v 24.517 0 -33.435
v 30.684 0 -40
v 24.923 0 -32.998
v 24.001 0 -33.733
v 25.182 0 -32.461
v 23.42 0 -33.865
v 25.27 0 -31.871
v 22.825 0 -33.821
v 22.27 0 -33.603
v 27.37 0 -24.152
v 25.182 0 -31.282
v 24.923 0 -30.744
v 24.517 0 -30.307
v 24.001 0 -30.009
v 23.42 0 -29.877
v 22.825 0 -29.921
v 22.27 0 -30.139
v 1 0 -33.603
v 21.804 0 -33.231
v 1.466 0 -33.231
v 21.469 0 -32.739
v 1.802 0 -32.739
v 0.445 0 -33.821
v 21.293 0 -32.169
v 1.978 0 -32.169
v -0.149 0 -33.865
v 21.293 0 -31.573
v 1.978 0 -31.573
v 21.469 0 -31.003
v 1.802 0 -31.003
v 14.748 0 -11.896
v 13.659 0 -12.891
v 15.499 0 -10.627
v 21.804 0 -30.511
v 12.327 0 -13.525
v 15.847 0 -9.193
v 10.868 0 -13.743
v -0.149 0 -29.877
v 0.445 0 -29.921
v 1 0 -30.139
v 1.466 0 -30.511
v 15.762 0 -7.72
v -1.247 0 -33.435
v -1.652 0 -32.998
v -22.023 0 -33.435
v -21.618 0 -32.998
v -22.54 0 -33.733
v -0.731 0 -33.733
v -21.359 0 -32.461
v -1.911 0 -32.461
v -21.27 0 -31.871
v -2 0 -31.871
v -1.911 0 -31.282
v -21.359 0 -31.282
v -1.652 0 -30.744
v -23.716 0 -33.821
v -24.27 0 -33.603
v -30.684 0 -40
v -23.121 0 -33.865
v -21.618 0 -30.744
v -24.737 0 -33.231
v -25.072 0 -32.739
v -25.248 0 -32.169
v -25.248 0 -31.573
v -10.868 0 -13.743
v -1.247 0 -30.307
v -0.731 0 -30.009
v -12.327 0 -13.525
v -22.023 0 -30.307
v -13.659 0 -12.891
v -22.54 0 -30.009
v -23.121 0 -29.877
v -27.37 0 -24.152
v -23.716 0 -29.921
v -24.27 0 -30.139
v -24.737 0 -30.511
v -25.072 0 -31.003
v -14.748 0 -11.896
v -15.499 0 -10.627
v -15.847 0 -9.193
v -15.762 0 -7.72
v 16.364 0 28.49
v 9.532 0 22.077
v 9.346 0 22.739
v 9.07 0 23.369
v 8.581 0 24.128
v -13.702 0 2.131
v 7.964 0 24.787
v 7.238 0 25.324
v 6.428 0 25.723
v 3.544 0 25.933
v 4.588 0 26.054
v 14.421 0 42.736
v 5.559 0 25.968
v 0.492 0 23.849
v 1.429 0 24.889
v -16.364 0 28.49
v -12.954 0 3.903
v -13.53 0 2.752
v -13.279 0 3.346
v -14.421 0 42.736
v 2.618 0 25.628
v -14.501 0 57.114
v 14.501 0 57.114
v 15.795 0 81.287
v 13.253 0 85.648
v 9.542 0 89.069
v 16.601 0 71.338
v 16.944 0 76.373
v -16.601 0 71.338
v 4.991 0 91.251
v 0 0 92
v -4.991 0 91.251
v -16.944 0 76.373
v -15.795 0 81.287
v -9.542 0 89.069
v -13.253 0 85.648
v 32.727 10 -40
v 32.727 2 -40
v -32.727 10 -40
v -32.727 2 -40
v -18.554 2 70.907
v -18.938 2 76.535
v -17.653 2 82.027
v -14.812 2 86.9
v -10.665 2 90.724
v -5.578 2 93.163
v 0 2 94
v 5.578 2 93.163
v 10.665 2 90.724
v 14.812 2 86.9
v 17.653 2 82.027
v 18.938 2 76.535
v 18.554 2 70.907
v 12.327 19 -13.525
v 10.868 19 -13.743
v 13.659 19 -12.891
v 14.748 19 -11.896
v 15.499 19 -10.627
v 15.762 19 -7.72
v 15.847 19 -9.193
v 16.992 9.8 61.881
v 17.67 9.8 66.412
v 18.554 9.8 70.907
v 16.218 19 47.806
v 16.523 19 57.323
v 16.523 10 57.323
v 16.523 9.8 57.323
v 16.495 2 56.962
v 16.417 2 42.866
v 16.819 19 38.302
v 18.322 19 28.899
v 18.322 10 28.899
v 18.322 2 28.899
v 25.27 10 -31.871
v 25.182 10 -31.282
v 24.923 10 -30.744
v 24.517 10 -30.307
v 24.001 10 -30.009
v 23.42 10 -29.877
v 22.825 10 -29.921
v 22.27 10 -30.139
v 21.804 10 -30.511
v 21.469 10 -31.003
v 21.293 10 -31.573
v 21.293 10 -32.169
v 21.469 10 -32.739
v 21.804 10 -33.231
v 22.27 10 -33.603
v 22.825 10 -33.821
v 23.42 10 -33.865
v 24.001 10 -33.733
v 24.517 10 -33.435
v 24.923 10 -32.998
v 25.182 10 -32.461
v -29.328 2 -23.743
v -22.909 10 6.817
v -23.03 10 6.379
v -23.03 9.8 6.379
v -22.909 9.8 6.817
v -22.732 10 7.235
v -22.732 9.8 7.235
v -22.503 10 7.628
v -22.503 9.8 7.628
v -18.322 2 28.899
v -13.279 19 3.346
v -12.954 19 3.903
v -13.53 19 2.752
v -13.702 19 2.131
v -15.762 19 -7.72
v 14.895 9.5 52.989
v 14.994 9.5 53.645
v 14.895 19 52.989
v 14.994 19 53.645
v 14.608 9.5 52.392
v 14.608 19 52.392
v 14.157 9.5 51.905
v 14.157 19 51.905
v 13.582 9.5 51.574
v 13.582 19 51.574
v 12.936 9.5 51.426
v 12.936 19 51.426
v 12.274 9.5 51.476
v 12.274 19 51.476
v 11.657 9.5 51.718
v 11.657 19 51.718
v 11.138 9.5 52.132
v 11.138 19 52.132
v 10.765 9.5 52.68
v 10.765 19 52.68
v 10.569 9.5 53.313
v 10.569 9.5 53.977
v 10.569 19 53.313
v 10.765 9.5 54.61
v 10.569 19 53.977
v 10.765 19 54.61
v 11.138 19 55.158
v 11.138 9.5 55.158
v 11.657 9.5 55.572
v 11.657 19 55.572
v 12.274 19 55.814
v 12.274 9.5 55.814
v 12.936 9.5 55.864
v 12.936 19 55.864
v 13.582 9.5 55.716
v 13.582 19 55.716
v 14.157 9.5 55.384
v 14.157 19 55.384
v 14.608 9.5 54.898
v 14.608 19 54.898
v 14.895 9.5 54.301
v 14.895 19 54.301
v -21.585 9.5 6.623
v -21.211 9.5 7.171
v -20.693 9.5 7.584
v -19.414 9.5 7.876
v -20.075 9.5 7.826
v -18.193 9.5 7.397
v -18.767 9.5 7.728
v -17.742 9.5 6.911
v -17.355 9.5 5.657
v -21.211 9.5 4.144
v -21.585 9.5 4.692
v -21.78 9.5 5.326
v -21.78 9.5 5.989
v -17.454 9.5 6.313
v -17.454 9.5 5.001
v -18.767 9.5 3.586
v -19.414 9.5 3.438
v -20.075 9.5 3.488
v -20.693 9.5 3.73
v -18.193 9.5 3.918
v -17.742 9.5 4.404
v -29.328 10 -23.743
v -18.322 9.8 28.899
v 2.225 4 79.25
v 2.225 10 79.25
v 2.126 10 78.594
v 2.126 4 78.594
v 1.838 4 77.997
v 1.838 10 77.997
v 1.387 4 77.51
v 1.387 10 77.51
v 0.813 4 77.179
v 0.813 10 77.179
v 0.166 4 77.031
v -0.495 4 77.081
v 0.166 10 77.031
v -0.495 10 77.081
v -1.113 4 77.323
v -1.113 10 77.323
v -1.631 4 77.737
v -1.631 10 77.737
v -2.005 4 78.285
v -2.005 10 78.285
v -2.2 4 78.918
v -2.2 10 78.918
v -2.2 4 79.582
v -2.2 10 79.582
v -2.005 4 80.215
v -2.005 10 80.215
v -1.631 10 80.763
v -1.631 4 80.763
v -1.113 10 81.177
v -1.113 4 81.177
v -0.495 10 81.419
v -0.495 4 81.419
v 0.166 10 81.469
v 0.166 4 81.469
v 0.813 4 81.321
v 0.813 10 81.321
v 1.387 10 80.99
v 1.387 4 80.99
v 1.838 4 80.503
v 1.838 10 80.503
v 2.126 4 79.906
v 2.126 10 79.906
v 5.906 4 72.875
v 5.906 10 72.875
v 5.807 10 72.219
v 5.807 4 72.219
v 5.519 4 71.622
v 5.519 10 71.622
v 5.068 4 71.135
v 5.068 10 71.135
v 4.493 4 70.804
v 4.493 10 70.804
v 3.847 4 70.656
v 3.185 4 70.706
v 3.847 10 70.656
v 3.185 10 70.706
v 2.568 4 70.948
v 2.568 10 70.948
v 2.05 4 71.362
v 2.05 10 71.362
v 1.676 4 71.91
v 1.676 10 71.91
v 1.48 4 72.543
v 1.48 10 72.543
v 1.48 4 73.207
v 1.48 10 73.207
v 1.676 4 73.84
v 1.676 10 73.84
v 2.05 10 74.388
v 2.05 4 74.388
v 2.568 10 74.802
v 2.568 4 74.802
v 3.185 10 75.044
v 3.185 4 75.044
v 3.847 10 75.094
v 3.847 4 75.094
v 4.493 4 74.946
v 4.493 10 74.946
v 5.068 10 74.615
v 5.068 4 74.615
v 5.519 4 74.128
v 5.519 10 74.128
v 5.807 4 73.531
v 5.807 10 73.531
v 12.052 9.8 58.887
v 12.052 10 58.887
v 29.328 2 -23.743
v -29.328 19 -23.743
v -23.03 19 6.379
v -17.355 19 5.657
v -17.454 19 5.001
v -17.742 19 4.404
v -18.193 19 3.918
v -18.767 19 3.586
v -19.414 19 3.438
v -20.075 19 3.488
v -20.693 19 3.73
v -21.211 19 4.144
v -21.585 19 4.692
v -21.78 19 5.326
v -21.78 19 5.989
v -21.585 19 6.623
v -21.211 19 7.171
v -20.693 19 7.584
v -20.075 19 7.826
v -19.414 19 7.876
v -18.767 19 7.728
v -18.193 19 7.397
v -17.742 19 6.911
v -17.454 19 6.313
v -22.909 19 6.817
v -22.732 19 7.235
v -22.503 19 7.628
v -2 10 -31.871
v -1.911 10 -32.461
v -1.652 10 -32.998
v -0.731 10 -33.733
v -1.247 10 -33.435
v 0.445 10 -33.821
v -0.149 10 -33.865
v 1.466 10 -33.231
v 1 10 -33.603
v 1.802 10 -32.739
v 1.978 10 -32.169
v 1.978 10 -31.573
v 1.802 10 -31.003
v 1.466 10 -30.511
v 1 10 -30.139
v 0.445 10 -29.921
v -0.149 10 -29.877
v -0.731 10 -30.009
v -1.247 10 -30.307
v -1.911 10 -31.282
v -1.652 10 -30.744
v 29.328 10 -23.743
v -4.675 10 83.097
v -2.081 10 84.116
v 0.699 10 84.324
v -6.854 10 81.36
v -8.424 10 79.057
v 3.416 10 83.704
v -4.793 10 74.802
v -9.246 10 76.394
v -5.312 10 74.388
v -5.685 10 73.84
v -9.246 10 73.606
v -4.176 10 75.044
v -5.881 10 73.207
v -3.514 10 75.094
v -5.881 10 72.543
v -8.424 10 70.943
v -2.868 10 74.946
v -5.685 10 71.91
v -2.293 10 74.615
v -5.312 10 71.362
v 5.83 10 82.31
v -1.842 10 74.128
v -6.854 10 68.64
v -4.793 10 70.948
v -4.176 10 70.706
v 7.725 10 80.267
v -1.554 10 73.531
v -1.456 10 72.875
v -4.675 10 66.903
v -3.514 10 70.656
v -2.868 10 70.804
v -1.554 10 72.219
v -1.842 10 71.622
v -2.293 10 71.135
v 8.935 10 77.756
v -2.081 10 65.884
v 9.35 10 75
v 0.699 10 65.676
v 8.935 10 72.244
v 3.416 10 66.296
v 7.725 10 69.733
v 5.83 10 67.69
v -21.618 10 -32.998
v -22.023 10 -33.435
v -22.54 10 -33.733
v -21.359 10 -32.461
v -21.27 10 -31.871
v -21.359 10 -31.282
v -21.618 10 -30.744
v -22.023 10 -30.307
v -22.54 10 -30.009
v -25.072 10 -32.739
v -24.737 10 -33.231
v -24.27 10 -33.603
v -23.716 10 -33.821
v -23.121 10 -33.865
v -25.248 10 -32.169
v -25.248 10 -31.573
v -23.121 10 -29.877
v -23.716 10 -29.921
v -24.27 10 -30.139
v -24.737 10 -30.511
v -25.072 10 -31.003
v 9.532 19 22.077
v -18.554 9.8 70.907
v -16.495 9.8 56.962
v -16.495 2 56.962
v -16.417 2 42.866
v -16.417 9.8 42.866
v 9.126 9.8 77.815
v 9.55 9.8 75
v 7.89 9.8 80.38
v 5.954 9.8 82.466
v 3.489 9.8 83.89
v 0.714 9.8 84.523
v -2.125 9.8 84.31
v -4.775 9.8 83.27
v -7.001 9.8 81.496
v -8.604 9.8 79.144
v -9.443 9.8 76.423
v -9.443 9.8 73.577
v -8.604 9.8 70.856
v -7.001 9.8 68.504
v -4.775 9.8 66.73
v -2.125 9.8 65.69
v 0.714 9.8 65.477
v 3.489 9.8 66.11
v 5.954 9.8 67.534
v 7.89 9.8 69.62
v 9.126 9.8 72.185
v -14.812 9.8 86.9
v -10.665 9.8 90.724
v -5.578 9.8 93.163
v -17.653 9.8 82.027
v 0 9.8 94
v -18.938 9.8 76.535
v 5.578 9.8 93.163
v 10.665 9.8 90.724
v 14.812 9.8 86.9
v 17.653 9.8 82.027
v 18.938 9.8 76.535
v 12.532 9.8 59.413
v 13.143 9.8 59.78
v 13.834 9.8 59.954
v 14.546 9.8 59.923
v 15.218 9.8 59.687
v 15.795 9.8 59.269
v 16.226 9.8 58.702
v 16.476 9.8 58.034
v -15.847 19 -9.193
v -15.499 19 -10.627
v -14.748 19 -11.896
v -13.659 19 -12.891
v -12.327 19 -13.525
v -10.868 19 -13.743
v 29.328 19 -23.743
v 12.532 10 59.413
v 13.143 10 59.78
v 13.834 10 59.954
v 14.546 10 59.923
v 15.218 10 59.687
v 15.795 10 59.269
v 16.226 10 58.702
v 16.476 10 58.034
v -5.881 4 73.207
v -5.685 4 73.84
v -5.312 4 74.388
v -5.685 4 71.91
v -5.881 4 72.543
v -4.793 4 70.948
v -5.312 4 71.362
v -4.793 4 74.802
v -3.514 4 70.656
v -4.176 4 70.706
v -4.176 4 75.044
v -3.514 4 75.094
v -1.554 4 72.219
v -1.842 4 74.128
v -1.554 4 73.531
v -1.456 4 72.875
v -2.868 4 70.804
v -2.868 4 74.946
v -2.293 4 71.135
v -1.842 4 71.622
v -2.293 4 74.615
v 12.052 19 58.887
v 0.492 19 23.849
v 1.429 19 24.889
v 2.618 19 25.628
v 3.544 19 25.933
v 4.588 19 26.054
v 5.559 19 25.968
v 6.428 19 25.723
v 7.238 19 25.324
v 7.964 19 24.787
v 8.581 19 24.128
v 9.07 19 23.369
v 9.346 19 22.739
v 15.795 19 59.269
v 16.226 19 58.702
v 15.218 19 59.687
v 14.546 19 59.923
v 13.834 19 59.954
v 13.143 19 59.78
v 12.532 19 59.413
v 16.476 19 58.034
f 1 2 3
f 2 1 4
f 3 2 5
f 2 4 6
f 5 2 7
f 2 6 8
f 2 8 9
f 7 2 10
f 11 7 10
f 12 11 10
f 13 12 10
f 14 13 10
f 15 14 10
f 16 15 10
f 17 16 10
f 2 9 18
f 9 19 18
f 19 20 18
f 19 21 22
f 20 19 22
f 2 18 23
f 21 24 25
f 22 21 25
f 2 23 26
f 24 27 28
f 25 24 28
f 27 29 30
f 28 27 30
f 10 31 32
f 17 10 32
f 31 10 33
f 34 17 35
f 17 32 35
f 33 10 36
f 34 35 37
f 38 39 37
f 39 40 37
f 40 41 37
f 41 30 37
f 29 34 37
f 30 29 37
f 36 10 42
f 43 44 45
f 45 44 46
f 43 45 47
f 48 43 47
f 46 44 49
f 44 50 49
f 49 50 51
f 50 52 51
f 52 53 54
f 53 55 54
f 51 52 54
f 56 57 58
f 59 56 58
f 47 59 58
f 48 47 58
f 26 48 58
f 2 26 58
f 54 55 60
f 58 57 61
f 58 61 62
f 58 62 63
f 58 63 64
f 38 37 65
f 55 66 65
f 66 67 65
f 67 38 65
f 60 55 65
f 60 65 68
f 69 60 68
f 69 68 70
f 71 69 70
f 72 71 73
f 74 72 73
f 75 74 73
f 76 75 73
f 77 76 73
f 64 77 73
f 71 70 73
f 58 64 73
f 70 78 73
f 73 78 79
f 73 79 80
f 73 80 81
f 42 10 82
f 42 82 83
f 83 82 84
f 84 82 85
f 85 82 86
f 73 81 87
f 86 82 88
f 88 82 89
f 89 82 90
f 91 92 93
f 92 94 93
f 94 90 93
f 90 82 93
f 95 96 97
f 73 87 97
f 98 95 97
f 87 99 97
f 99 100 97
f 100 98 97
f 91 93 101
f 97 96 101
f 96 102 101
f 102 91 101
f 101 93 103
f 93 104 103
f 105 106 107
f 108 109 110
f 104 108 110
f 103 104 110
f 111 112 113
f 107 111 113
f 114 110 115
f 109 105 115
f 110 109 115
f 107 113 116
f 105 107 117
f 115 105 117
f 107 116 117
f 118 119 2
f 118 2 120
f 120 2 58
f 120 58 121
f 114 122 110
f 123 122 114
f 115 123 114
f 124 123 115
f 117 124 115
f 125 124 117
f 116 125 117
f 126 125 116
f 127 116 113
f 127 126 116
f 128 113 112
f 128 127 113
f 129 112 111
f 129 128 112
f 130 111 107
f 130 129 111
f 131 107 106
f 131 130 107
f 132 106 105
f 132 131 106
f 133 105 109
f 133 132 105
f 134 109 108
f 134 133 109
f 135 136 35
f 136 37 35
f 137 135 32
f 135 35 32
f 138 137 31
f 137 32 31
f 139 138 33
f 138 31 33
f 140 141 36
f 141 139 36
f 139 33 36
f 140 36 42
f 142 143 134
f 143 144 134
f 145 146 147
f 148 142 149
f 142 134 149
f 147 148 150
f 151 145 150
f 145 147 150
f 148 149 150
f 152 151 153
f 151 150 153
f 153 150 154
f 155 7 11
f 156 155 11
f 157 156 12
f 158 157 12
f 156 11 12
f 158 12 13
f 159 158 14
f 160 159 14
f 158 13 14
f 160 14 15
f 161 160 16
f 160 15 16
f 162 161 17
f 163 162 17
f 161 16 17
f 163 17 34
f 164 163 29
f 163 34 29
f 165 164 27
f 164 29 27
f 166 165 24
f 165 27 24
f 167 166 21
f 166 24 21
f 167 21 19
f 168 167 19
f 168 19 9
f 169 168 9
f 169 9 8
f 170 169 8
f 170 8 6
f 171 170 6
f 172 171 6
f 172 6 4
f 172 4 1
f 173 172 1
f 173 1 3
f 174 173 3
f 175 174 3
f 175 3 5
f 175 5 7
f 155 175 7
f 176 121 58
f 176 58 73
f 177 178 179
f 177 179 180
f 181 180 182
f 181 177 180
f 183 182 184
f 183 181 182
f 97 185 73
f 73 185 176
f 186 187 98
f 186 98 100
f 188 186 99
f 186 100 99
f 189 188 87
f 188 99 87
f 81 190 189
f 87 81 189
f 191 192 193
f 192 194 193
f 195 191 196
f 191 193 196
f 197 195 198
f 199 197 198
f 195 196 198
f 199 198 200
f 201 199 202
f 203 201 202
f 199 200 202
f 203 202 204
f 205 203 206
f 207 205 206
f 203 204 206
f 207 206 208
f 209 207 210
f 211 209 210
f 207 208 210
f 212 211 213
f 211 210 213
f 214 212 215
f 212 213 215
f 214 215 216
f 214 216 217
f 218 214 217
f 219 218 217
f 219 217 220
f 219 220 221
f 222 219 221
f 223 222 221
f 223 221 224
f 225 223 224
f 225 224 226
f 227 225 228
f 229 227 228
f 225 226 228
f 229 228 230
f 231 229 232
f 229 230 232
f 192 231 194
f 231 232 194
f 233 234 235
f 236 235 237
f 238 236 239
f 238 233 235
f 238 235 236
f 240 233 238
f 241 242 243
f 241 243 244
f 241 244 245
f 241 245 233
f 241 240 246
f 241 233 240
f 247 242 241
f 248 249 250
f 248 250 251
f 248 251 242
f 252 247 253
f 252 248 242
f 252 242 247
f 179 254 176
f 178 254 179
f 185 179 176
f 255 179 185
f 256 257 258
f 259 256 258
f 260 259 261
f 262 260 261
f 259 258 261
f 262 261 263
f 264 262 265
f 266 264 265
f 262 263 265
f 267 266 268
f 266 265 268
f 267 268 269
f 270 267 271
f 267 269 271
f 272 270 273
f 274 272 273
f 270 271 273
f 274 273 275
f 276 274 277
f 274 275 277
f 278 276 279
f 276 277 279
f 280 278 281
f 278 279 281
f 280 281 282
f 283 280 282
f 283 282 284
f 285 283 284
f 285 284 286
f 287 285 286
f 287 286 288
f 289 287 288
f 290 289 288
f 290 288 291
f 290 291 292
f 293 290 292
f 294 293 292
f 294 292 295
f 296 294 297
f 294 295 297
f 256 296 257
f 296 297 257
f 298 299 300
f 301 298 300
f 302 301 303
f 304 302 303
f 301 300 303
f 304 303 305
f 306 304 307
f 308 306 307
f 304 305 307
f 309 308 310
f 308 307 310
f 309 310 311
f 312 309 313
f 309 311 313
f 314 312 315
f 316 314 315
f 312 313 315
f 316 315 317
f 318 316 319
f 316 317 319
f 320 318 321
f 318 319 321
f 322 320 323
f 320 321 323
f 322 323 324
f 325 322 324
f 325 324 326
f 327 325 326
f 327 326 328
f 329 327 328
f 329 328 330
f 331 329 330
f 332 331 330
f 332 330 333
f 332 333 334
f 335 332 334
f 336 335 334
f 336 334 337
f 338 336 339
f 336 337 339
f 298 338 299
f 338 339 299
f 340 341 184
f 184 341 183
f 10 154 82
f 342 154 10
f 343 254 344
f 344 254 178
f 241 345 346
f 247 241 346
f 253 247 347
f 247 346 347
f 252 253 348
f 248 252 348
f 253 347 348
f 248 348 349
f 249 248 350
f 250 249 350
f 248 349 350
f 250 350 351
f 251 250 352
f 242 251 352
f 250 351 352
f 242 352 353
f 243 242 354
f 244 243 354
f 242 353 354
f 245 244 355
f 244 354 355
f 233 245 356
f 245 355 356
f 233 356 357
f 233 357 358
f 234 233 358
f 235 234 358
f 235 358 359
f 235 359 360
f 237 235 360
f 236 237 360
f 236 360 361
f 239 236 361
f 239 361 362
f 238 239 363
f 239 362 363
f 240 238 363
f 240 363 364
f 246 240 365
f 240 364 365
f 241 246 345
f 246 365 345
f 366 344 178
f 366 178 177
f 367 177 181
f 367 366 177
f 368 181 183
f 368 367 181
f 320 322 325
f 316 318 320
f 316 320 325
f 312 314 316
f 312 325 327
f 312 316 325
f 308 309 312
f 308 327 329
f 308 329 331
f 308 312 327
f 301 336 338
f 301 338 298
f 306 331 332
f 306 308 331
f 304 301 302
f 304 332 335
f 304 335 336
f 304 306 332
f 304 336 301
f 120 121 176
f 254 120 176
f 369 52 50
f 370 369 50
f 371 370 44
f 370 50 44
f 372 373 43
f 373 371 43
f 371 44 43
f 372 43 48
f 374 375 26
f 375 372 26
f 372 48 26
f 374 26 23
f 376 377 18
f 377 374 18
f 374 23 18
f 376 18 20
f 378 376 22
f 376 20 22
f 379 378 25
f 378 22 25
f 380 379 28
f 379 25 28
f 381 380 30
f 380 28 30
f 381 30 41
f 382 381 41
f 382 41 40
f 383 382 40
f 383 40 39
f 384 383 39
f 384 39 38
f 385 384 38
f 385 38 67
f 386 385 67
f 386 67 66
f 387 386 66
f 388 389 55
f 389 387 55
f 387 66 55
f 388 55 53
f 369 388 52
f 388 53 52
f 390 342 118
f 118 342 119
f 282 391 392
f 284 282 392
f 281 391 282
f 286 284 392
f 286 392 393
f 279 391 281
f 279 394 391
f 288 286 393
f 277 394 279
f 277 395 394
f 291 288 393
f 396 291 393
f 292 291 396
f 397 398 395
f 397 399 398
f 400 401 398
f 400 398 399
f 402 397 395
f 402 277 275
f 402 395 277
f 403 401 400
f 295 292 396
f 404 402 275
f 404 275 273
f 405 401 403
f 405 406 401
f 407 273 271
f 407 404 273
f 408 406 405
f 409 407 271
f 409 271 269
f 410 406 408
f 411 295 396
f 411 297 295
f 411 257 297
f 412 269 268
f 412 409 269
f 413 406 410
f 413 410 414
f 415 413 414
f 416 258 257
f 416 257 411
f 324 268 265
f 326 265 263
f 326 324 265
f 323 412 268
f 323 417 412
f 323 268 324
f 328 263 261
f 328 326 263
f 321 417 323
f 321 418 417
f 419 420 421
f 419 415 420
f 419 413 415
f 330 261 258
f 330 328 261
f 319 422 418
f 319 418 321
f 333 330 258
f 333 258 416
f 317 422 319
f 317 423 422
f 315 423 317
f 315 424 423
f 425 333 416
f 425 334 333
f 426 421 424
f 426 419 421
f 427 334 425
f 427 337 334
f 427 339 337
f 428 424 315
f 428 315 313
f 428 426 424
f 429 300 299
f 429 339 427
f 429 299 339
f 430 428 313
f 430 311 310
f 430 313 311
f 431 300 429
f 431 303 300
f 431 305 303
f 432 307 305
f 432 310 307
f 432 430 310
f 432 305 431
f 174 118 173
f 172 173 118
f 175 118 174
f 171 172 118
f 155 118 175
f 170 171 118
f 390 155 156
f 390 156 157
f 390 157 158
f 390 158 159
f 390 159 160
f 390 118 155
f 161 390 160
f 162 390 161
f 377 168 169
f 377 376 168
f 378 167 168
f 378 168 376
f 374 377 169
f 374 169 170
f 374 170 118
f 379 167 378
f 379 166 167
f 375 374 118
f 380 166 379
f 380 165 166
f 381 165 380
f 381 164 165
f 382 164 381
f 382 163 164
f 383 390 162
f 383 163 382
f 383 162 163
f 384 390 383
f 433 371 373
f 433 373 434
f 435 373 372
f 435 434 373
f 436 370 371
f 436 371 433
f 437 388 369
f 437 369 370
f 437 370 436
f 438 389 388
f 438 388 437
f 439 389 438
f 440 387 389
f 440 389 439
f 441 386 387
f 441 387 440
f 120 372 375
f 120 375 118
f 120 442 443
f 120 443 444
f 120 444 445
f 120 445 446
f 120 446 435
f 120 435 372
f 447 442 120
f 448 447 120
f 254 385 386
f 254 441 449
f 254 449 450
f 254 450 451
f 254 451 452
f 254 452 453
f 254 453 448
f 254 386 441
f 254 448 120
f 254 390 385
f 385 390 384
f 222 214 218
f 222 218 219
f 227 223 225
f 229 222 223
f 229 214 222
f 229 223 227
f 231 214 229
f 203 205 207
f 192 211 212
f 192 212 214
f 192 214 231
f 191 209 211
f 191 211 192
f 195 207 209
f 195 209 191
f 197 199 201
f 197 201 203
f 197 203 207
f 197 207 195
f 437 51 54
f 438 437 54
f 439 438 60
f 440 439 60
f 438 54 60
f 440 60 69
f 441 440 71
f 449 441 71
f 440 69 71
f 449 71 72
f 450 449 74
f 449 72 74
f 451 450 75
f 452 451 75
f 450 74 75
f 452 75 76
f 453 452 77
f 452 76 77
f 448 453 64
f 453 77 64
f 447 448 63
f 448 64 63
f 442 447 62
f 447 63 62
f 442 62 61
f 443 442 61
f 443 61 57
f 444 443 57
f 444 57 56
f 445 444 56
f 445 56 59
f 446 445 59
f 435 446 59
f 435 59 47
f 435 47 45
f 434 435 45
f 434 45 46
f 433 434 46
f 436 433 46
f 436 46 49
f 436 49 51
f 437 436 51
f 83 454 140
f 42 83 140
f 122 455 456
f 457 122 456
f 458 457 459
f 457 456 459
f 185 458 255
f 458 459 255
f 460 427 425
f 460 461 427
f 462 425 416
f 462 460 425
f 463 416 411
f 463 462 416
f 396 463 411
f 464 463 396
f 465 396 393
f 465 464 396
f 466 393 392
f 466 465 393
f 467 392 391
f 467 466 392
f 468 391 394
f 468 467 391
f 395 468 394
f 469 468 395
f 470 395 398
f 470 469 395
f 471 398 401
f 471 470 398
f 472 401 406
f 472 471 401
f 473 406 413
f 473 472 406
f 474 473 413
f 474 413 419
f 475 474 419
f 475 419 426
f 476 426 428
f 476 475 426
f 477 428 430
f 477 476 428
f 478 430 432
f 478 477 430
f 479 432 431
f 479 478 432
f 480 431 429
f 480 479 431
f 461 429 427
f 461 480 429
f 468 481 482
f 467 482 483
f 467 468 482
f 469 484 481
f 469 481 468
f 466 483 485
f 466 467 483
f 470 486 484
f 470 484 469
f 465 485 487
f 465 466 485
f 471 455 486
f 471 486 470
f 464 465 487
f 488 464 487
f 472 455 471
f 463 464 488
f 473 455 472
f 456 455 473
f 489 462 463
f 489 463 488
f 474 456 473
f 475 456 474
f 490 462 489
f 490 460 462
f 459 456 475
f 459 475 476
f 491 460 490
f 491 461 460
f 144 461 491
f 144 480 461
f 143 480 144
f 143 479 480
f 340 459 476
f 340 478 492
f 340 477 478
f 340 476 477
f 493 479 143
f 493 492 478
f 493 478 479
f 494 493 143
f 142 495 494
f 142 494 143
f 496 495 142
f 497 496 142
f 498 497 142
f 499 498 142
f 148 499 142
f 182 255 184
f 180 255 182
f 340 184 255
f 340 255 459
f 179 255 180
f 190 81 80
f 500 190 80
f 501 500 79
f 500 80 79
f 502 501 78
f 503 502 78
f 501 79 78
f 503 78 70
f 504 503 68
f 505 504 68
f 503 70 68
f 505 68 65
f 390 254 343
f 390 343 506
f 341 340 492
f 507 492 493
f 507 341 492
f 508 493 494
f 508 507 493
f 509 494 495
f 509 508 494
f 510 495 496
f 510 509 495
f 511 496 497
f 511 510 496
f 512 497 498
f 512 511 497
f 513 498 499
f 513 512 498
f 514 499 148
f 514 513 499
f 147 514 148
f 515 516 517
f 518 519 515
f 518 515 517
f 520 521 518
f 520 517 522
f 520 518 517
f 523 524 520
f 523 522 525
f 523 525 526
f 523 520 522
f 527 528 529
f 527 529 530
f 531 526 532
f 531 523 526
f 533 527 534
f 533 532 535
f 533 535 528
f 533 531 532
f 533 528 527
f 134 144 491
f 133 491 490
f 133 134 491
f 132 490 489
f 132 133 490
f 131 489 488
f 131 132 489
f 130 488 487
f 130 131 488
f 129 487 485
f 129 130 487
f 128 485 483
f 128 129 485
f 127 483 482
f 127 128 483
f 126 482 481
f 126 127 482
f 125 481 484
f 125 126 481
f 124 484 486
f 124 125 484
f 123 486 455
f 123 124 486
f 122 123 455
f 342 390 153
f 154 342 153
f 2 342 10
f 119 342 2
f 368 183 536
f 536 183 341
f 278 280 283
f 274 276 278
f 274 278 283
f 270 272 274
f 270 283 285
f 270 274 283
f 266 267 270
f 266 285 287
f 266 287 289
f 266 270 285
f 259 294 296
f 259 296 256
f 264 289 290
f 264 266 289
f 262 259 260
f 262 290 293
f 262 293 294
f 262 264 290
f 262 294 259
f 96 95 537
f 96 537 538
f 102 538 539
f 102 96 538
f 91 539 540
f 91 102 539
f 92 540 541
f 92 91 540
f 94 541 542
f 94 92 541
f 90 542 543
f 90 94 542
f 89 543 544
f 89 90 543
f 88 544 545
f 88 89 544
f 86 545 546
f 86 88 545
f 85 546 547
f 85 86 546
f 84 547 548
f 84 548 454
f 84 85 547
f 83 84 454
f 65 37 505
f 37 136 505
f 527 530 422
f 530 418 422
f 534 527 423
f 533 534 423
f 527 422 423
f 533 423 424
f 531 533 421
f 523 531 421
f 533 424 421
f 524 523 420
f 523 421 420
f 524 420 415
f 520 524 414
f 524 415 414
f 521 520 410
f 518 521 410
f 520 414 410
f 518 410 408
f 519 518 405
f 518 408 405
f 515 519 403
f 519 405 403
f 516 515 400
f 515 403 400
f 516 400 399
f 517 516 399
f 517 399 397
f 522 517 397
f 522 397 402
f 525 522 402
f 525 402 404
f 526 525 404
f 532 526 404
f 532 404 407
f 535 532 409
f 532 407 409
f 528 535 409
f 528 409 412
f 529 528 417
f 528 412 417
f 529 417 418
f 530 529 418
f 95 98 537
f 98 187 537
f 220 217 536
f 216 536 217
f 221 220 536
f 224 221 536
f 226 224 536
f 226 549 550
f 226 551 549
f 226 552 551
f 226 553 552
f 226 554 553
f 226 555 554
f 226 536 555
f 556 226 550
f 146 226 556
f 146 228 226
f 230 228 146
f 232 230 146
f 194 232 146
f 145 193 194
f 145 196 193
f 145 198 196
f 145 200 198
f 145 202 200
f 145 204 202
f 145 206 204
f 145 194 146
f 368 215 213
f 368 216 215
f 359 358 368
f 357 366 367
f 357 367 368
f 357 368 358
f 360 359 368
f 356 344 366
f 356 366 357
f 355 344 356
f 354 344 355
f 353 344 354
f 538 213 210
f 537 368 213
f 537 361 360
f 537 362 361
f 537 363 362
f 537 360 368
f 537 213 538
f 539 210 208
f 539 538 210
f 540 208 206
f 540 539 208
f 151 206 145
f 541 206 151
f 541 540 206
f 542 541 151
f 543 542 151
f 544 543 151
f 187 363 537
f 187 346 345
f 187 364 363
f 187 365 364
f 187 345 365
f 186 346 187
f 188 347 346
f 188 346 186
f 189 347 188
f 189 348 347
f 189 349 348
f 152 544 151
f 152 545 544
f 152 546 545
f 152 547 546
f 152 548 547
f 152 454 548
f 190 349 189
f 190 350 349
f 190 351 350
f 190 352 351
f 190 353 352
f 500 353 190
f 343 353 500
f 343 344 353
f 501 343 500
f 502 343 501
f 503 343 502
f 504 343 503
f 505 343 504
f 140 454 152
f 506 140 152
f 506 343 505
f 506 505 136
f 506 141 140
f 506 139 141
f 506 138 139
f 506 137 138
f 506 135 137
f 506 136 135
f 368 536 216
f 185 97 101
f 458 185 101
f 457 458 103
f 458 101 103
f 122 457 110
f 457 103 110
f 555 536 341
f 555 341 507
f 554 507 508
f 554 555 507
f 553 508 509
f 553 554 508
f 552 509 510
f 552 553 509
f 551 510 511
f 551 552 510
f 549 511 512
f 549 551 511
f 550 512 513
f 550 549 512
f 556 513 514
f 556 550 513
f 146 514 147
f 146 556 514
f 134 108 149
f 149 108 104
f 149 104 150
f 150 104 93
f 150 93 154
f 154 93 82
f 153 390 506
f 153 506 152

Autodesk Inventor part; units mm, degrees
ref_plane "YZ Plane" through (0, 0, 0) normal (1, 0, 0) x (0, 1, 0)
ref_plane "XZ Plane" through (0, 0, 0) normal (0, 1, 0) x (-1, 0, 0)
ref_plane "XY Plane" through (0, 0, 0) normal (0, 0, 1) x (1, 0, 0)
sketch "Sketch1" plane through (0, 0, 0) normal (0, 1, 0) x (-1, 0, 0)
  line L0 (0, 75) -> (0, -75) construction
  arc A0 (18.258988, 69.745538) -> (-18.258988, 69.745538) centre (0, 75) ccw
  line L1 (0, -196.504208) -> (0, 248.158352) construction
  line L2 (-25.341268, -40) -> (25.341268, -40)
  line L3 (25.341268, -40) -> (20, -23.743159)
  line L4 (20, -23.743159) -> (-20, -23.743159)
  line L5 (-20, -23.743159) -> (-25.341268, -40)
  circle A1 centre (12, -31.871075) radius 2
  circle A2 centre (-12, -31.871075) radius 2
  circle A3 centre (0, -31.871075) radius 2
  circle A4 centre (0, -75) radius 23.5
  circle A5 centre (170.873428, 25.827072) radius 158.808057
  circle A6 centre (-170.873428, 25.827072) radius 158.808057
  point P0 (0, 0)
  dimension "d0" = 150
  dimension "d1" = 75
  dimension "d22" = 38
  dimension "d33" = 47
  dimension "d34" = 4
  dimension "d35" = 71.8118
  dimension "d36" = 71.8118
  dimension "d37" = 16.25684
  dimension "d38" = 35
  dimension "d39" = 35
  dimension "d40" = 0
  dimension "d41" = 48.15025
  dimension "d42" = 0
  dimension "d43" = 48.15025
  dimension "d44" = 0
  dimension "d45" = 8.12893
  dimension "d46" = 10.13733
  dimension "d47" = 8.12893
  dimension "d48" = 21.53777
  dimension "d49" = 8.12893
  dimension "d50" = 32.93821
  dimension "d51" = 0
  dimension "d52" = 16.25684
  dimension "d53" = 38.00145
  dimension "d54" = 16.25684
extrude "Extrusion1" add sketch "Sketch1" along normal blind 10 contours A5 L4 A6 A0 | L3 L2 L5 L4 | A1 | A2
sketch "Sketch4" plane through (0, 10, 0) normal (0, 1, 0) x (1, 0, 0)
  circle A0 centre (3.680608, -72.875) radius 1.5
  circle A1 centre (0, -79.25) radius 1.5
  circle A2 centre (-3.680608, -72.875) radius 1.5
  arc A3 (5.450881, -75.044363) -> (2.76386, -79.69842) centre (10.238345, -80.911111) ccw
  arc A4 (5.450881, -75.044363) -> (2.687021, -70.257217) centre (3.680608, -72.875) ccw
  arc A5 (-2.687021, -70.257217) -> (2.687021, -70.257217) centre (0, -63.177778) ccw
  arc A6 (-2.687021, -70.257217) -> (-5.450881, -75.044363) centre (-3.680608, -72.875) ccw
  arc A7 (-2.76386, -79.69842) -> (-5.450881, -75.044363) centre (-10.238345, -80.911111) ccw
  arc A8 (-2.76386, -79.69842) -> (2.76386, -79.69842) centre (0, -79.25) ccw
  point P0 (0, 0)
extrude "Extrusion4" cut sketch "Sketch4" against normal through all contours A0 | A1 | A2
sketch "Sketch5" plane through (0, 10, 0) normal (0, 1, 0) x (1, 0, 0)
  circle A0 centre (-3.680608, -72.875) radius 1.5
  circle A1 centre (-3.680608, -72.875) radius 2.225
  circle A2 centre (0, -79.25) radius 1.5
  circle A3 centre (0, -79.25) radius 2.225
  circle A4 centre (3.680608, -72.875) radius 1.5
  circle A5 centre (3.680608, -72.875) radius 2.225
  point P0 (0, 0)
  dimension "d69" = 4.45
  dimension "d70" = 4.45
  dimension "d71" = 4.45
extrude "Extrusion5" cut sketch "Sketch5" against normal blind 6 contours A0 | A1 | A2 | A3 | A4 | A5
sketch "Sketch6" plane through (0, 0, 0) normal (0, -1, 0) x (1, 0, 0)
  circle A0 centre (0, 79.25) radius 1.5
  circle A1 centre (3.680608, 72.875) radius 1.5
  circle A2 centre (-3.680608, 72.875) radius 1.5
  point P0 (0, 0)
extrude "Extrusion6" add sketch "Sketch6" against normal up to surface (4 mm away)
sketch "Sketch7" plane through (0, 0, 0) normal (0, -1, 0) x (1, 0, 0)
  circle A0 centre (23.270461, -31.871075) radius 2
  circle A1 centre (-23.270461, -31.871075) radius 2
  circle A2 centre (0, -31.871075) radius 2
  line L0 (-32.726793, -40) -> (32.726793, -40)
  line L1 (-29.32798, -23.743159) -> (29.32798, -23.743159)
  line L2 (-25.341268, -40) -> (-20, -23.743159)
  line L3 (20, -23.743159) -> (25.341268, -40)
  line L4 (29.32798, -23.743159) -> (32.726793, -40)
  line L5 (-32.726793, -40) -> (-29.32798, -23.743159)
  point P0 (0, 0)
  point P1 (22.130539, -30.227731)
  point P2 (23.327313, -33.870267)
  point P3 (-23.327313, -33.870267)
  point P4 (-22.130539, -30.227731)
extrude "Extrusion7" add sketch "Sketch7" against normal up to surface (10 mm away) contours A0 L3 | A0 L3 L1 L4 L0 | L2 A1 L0 L5 L1 | L2 A1 | A1 L2 picked at (24.149861, -31.36133)
sketch "Sketch8" plane through (0, 10, 0) normal (0, 1, 0) x (1, 0, 0)
  arc A0 (-18.258988, -69.745538) -> (18.258988, -69.745538) centre (0, -75) ccw
  line L0 (0, -75) -> (0, -57.620328) construction
  line L1 (-29.32798, 23.743159) -> (-32.726793, 40)
  line L2 (-29.32798, 23.743159) -> (-18.322098, -28.899016)
  arc A1 (-18.553855, -70.906779) -> (-18.322098, -28.899016) centre (-116.205725, -49.363513) ccw
  arc A2 (-18.258988, -69.745538) -> (18.258988, -69.745538) centre (0, -75) ccw
  circle A3 centre (0, -75) radius 19
  arc A4 (-18.258988, -69.745538) -> (-20, 23.743159) centre (-170.873428, -25.827072) ccw
  line L3 (-20, 23.743159) -> (-29.32798, 23.743159)
  arc A5 (20, 23.743159) -> (18.258988, -69.745538) centre (170.873428, -25.827072) ccw
  line L4 (29.32798, 23.743159) -> (20, 23.743159)
  line L5 (29.32798, 23.743159) -> (18.322098, -28.899016)
  arc A6 (18.322098, -28.899016) -> (18.553855, -70.906779) centre (116.205725, -49.363513) ccw
  point P0 (0, 0)
  point P1 (18.553855, -70.906779)
  point P2 (-18.553855, -70.906779)
  dimension "d80" = 100
extrude "Extrusion8" add sketch "Sketch8" against normal blind 10 contours A0 A1 L2 L3 A4 | A5 L4 L5 A6 A0
sketch "Sketch11" plane through (0, 0, 0) normal (0, -1, 0) x (1, 0, 0)
  circle A0 centre (23.270461, -31.871075) radius 2
  circle A1 centre (-23.270461, -31.871075) radius 2
  point P0 (0, 0)
extrude "Extrusion11" cut sketch "Sketch11" against normal through all
chamfer "Chamfer1" distance 2 angle 45 5 edges at (-25.5244, 0, -5.5505) (-16.2072, 0, 49.9152) (0, 0, 94) (16.2072, 0, 49.9152) (25.5244, 0, -5.5505)
sketch "Sketch17" plane through (0, 10, 0) normal (0, 1, 0) x (1, 0, 0)
  line L0 (-83.121979, 82.295999) -> (15.75457, -64.379571)
  line L1 (-29.32798, 23.743159) -> (29.32798, 23.743159)
  circle A0 centre (-23.270461, 31.871075) radius 2
  circle A1 centre (23.270461, 31.871075) radius 2
  circle A2 centre (0, 31.871075) radius 2
  arc A3 (-18.553855, -70.906779) -> (18.553855, -70.906779) centre (0, -75) ccw
  arc A4 (18.322098, -28.899016) -> (18.553855, -70.906779) centre (116.205725, -49.363513) ccw
  line L2 (32.726793, 40) -> (18.322098, -28.899016)
  line L3 (-32.726793, 40) -> (32.726793, 40)
  line L4 (-32.726793, 40) -> (-18.322098, -28.899016)
  arc A5 (-18.553855, -70.906779) -> (-18.322098, -28.899016) centre (-116.205725, -49.363513) ccw
  circle A6 centre (-3.680608, -72.875) radius 2.225
  circle A7 centre (0, -79.25) radius 2.225
  circle A8 centre (3.680608, -72.875) radius 2.225
  line L5 (15.75457, -64.379571) -> (17.86641, -67.512319)
  line L6 (-32.726793, 40) -> (-18.322098, -28.899016)
  point P0 (0, 0)
  point P1 (-22.889065, -7.054783)
extrude "Extrusion16" add sketch "Sketch17" along normal blind 9 contours L4 L1 L2 A4 L5 L0
sketch "Sketch18" plane through (0, 19, 0) normal (0, 1, 0) x (1, 0, 0)
  circle A0 centre (13.844472, -83.053003) radius 1.5
  circle A1 centre (-8.053003, -88.844472) radius 1.5
  circle A2 centre (8.053003, -61.155528) radius 1.5
  circle A3 centre (-13.844472, -66.946997) radius 1.5
  circle A4 centre (57.038778, -59.914319) radius 1.5
  circle A5 centre (0, -75) radius 12.1825
  line L0 (54.737573, -51.213489) -> (22.535282, -59.730387)
  arc A6 (59.339984, -68.61515) -> (54.737573, -51.213489) centre (57.038778, -59.914319) ccw
  line L1 (27.137693, -77.132048) -> (59.339984, -68.61515)
  arc A7 (27.137693, -77.132048) -> (15.997897, -85.250234) centre (31.995793, -95.500468) ccw
  arc A8 (8.838591, -58.180983) -> (15.997897, -85.250234) centre (0, -75) ccw
  arc A9 (8.838591, -58.180983) -> (22.535282, -59.730387) centre (17.677181, -41.361967) ccw
  arc A10 (18.322098, -28.899016) -> (17.86641, -67.512319) centre (116.205725, -49.363513) ccw
  line L2 (18.322098, -28.899016) -> (29.32798, 23.743159)
  line L3 (29.32798, 23.743159) -> (-29.32798, 23.743159)
  line L4 (-29.32798, 23.743159) -> (-22.889065, -7.054783)
  line L5 (-22.889065, -7.054783) -> (17.86641, -67.512319)
  circle A11 centre (-19.580037, -5.657222) radius 3.525
  circle A12 centre (14.082222, -57.518268) radius 2.448572
  arc A13 (18.322098, -28.899016) -> (17.86641, -67.512319) centre (116.205725, -49.363513) ccw
  point P0 (0, 0)
  point P1 (-22.502925, -7.627592)
  point P2 (-23.030435, -6.378596)
  point P3 (16.523025, -57.323365)
  point P4 (12.051896, -58.886946)
  dimension "d117" = 7.05
extrude "Extrusion17" cut sketch "Sketch18" against normal up to surface (9 mm away) contours A10 L5 A9 | A9 A12 A10 | A9 L5 A12 | L5 L4 A11
sketch "Sketch19" plane through (0, 19, 0) normal (0, 1, 0) x (1, 0, 0)
  arc A0 (-23.030435, -6.378596) -> (-22.502925, -7.627592) centre (-19.580037, -5.657222) ccw
  circle A1 centre (-19.580037, -5.657222) radius 2.225
  circle A2 centre (12.769294, -53.644906) radius 3.525 construction
  line L0 (-22.502925, -7.627592) -> (12.051896, -58.886946)
  arc A3 (18.322098, -28.899016) -> (16.523025, -57.323365) centre (116.205725, -49.363513) ccw
  circle A4 centre (12.769294, -53.644906) radius 2.225
  point P0 (0, 0)
  dimension "d120" = 4.45
  dimension "d121" = 7.05
  dimension "d122" = 4.45
extrude "Extrusion18" cut sketch "Sketch19" against normal blind 9.5
sketch "Sketch20" plane through (0, 19, 0) normal (0, 1, 0) x (1, 0, 0)
  circle A0 centre (-19.580037, -5.657222) radius 2.225
  circle A1 centre (12.769294, -53.644906) radius 2.225
  arc A2 (-23.030435, -6.378596) -> (-22.502925, -7.627592) centre (-19.580037, -5.657222) ccw
  line L0 (-22.502925, -7.627592) -> (12.051896, -58.886946)
  arc A3 (12.051896, -58.886946) -> (16.523025, -57.323365) centre (14.082222, -57.518268) ccw
  arc A4 (18.322098, -28.899016) -> (16.523025, -57.323365) centre (116.205725, -49.363513) ccw
  line L1 (18.322098, -28.899016) -> (29.32798, 23.743159)
  line L2 (29.32798, 23.743159) -> (-29.32798, 23.743159)
  line L3 (-29.32798, 23.743159) -> (-23.030435, -6.378596)
  line L4 (-13.501752, -3.090072) -> (7.292792, -33.93714)
  arc A5 (8.533736, -26.852566) -> (7.292792, -33.93714) centre (116.205725, -49.363513) ccw
  line L5 (8.533736, -26.852566) -> (17.02107, 13.743159)
  line L6 (17.02107, 13.743159) -> (-17.02107, 13.743159)
  line L7 (-17.02107, 13.743159) -> (-13.501752, -3.090072)
  point P0 (0, 0)
  dimension "d125" = 10
extrude "Extrusion19" cut sketch "Sketch20" against normal through all contours L7 L6 L5 A5 L4
fillet "Fillet2" radius 5 4 edges at (-13.5018, 9.5, 3.0901) (7.2928, 9.5, 33.9371) (-17.0211, 9.5, -13.7432) (17.0211, 9.5, -13.7432)
sketch "Sketch21" plane through (0, 10, 0) normal (0, 1, 0) x (1, 0, 0)
  line L0 (12.051896, -58.886946) -> (-22.502925, -7.627592)
  arc A0 (-23.030435, -6.378596) -> (-22.502925, -7.627592) centre (-19.580037, -5.657222) ccw
  line L1 (-23.030435, -6.378596) -> (-18.322098, -28.899016)
  arc A1 (-18.553855, -70.906779) -> (-18.322098, -28.899016) centre (-116.205725, -49.363513) ccw
  arc A2 (-18.553855, -70.906779) -> (18.553855, -70.906779) centre (0, -75) ccw
  arc A3 (16.523025, -57.323365) -> (18.553855, -70.906779) centre (116.205725, -49.363513) ccw
  arc A4 (12.051896, -58.886946) -> (16.523025, -57.323365) centre (14.082222, -57.518268) ccw
  circle A5 centre (-3.680608, -72.875) radius 2.225
  circle A6 centre (0, -79.25) radius 2.225
  circle A7 centre (3.680608, -72.875) radius 2.225
  circle A8 centre (0, -75) radius 8.5 construction
  circle A9 centre (0, -75) radius 9.35
  point P0 (0, 0)
  dimension "d129" = 17
  dimension "d130" = 0.85
extrude "Extrusion20" cut sketch "Sketch21" against normal blind 0.2 contours A4 A3 A2 A1 L1 A0 L0
chamfer "Chamfer2" distance 0.2 angle 45 1 edges at (-9.35, 9.8, 75)
equation "\"d1\" = 0.5 * d0"
properties part number "motion_thigh_bot_3DPrint"
